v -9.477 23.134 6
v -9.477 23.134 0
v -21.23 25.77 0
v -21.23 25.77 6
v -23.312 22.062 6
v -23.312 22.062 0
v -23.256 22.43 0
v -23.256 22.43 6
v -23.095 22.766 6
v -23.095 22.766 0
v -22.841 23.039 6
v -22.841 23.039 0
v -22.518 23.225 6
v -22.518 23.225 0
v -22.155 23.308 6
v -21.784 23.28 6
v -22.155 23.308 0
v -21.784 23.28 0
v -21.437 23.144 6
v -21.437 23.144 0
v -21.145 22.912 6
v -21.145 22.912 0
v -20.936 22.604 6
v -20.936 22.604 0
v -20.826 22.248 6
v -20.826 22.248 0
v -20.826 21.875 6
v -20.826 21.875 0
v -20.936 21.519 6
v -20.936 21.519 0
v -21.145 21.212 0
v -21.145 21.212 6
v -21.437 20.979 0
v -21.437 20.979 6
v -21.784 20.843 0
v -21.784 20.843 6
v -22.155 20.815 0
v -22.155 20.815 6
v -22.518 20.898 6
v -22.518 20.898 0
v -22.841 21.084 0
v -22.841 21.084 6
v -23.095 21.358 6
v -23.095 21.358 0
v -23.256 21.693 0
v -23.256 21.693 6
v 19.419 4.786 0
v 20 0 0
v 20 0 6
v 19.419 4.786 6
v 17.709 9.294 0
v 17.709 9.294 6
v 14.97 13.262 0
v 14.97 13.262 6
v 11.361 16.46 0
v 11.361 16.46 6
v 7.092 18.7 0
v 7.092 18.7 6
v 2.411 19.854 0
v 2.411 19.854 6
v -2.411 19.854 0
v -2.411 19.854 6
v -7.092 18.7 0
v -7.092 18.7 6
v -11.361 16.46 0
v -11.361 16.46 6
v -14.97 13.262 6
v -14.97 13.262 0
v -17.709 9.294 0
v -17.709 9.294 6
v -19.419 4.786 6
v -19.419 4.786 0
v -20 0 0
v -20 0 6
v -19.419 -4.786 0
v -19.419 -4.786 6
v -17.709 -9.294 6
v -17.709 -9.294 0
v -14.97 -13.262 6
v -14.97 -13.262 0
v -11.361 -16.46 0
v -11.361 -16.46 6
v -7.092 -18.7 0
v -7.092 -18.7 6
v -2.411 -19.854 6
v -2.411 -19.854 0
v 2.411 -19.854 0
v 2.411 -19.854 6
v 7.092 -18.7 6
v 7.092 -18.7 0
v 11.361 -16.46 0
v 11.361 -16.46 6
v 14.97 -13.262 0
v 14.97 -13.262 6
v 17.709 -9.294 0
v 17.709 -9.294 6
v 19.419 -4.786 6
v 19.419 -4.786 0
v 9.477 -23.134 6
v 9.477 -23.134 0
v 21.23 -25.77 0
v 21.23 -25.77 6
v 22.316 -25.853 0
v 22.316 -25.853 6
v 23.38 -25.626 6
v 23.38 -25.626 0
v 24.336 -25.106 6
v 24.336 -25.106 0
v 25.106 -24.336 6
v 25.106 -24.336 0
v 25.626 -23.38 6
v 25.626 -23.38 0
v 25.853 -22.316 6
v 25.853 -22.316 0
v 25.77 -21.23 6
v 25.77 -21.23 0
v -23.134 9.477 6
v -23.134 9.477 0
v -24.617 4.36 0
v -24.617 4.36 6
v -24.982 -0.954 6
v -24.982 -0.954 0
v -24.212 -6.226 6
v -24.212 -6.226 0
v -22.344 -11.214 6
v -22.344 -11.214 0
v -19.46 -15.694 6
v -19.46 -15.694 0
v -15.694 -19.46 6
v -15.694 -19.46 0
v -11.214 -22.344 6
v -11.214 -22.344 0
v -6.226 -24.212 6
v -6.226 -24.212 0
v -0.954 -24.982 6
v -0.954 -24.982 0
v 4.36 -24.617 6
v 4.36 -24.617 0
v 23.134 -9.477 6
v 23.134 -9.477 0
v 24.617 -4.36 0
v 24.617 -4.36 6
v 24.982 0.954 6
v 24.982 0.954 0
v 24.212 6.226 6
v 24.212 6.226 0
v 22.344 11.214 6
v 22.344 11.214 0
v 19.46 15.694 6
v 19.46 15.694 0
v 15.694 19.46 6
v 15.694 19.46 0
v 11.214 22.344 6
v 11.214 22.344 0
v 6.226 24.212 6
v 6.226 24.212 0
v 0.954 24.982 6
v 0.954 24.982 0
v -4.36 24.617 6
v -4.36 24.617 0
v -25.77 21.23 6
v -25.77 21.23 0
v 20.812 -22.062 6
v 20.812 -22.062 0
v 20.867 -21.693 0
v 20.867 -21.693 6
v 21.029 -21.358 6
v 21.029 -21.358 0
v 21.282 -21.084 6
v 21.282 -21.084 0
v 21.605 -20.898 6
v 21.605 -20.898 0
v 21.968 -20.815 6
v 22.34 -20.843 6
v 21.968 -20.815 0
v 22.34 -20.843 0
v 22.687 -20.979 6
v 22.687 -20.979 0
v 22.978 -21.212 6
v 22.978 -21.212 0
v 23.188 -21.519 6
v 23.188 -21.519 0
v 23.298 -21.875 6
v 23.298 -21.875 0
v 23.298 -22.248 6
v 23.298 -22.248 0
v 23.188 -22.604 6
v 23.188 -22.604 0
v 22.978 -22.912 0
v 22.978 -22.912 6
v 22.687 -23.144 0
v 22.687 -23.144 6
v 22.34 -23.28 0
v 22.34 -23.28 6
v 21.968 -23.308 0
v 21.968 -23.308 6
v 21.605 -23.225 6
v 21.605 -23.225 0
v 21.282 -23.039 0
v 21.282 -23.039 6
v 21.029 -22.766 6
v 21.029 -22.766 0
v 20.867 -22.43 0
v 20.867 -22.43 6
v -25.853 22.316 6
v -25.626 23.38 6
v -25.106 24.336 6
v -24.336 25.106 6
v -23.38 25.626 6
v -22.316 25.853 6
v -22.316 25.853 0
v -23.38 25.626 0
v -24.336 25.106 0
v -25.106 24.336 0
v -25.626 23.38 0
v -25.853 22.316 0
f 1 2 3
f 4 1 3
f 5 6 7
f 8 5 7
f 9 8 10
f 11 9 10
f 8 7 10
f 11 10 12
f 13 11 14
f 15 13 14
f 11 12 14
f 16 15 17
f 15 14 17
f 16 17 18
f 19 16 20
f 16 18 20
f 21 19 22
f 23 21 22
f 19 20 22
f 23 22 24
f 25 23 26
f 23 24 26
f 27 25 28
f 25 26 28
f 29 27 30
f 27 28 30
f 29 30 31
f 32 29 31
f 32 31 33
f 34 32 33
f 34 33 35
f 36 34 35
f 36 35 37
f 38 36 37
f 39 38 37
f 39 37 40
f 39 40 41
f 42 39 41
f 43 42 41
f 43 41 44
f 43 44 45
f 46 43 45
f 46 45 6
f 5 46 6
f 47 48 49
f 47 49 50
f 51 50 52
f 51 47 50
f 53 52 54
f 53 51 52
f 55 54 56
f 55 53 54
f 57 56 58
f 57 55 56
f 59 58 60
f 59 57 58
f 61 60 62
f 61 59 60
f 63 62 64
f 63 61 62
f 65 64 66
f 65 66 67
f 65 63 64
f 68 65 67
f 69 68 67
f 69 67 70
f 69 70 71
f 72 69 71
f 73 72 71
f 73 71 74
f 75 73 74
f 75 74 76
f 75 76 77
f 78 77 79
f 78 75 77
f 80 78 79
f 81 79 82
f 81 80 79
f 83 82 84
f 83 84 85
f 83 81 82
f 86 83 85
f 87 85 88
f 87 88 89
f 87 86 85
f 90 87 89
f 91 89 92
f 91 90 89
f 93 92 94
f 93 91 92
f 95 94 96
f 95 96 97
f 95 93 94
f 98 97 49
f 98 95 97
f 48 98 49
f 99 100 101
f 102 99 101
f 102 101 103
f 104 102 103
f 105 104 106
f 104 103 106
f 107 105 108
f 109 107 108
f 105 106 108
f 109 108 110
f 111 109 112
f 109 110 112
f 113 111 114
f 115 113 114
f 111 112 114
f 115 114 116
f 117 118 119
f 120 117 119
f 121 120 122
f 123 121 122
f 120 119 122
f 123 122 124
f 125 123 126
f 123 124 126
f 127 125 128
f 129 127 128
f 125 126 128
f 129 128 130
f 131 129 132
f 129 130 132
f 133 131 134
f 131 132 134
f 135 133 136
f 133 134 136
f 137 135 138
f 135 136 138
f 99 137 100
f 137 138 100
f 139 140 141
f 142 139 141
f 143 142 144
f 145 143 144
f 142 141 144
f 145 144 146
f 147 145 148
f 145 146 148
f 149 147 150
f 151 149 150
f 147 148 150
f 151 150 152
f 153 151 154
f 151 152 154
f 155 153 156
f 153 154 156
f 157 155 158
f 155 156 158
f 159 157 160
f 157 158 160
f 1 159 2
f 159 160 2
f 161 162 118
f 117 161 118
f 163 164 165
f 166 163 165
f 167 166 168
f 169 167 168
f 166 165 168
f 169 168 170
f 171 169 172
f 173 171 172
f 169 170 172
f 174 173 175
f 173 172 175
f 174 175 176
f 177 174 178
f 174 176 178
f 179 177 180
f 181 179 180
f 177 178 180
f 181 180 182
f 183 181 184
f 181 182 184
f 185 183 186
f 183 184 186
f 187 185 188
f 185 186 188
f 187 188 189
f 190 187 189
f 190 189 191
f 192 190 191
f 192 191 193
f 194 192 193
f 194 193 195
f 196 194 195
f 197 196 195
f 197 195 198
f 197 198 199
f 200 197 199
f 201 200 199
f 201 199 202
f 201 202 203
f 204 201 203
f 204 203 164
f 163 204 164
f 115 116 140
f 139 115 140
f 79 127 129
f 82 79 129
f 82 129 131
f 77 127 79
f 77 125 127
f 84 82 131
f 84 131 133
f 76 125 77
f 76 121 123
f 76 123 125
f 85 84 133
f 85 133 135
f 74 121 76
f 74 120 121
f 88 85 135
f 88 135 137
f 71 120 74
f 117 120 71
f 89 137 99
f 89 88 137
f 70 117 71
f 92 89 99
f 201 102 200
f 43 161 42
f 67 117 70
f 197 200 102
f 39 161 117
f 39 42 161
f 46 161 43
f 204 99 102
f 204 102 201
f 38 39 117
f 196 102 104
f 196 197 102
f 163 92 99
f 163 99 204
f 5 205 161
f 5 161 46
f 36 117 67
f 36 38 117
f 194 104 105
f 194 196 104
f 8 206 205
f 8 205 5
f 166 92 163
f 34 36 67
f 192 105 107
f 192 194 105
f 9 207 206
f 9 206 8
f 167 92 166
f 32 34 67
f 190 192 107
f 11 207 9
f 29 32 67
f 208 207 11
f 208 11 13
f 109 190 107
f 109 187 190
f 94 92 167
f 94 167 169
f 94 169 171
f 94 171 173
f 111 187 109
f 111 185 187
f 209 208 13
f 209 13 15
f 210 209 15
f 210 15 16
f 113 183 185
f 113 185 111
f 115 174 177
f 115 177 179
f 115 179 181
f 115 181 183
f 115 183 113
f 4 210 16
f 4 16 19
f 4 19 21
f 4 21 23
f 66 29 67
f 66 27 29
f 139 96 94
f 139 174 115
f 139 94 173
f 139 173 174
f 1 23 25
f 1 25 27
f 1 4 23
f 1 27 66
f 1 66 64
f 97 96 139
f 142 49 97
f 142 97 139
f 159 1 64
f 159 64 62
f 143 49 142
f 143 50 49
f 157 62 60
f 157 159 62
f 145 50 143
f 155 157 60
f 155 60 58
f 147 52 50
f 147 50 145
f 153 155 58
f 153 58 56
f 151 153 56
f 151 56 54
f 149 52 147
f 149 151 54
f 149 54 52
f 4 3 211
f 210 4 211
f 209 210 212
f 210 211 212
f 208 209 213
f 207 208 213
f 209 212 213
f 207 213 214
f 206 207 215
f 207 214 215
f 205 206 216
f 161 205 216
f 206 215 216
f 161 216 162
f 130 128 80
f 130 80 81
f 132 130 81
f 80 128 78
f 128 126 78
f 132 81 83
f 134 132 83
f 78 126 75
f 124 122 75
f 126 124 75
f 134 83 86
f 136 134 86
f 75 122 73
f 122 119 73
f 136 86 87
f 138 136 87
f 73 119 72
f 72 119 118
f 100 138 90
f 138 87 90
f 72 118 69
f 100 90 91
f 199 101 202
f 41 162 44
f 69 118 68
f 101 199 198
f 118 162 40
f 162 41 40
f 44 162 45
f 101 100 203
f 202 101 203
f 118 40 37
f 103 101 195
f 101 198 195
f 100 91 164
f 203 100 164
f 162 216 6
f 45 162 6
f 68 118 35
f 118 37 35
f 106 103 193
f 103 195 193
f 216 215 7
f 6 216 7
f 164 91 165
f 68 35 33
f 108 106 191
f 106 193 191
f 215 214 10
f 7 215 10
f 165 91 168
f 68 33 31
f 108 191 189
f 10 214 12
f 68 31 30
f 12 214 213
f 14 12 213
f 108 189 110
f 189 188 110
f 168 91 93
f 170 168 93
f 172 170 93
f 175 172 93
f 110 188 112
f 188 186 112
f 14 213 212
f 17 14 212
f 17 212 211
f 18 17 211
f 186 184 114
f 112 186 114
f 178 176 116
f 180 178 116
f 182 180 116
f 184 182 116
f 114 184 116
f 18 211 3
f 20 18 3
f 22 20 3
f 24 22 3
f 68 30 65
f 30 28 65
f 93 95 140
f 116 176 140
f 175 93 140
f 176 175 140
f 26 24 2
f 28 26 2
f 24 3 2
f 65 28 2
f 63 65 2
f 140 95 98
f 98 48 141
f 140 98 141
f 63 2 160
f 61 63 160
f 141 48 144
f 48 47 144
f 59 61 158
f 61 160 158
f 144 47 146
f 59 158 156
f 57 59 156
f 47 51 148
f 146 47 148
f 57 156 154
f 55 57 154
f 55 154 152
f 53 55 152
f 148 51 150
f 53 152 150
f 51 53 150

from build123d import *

# Parameters (mm, degrees)
SKETCH_1_R        = 20
EXTRUDE_1_DEPTH   = 6
HOLE_WIZARD_M31_D = 2.5


with BuildPart() as part:
    # Эскиз1 → Бобышка-Вытянуть1 (new body)
    with BuildSketch(Plane.XY):
        with BuildLine():
            Line((9.476919675, -23.134130489), (21.23028272, -25.76965455))
            ThreePointArc((21.23028272, -25.76965455), (24.748737342, -24.748737342), (25.76965455, -21.23028272))
            Line((25.76965455, -21.23028272), (23.134130489, -9.476919675))
            ThreePointArc((23.134130489, -9.476919675), (17.67766953, 17.67766953), (-9.476919675, 23.134130489))
            Line((-9.476919675, 23.134130489), (-21.23028272, 25.76965455))
            ThreePointArc((-21.23028272, 25.76965455), (-24.748737342, 24.748737342), (-25.76965455, 21.23028272))
            Line((-25.76965455, 21.23028272), (-23.134130489, 9.476919675))
            ThreePointArc((-23.134130489, 9.476919675), (-17.67766953, -17.67766953), (9.476919675, -23.134130489))
        make_face()
        Circle(SKETCH_1_R, mode=Mode.SUBTRACT)
    extrude(amount=EXTRUDE_1_DEPTH)

    # Отверстие обработанное метчиком M31 (through all)
    with Locations(Plane.XY.offset(6)):
        with Locations((-22.061731573, 22.061731573), (22.061731573, -22.061731573)):
            Hole(HOLE_WIZARD_M31_D / 2)


solid = part.part
